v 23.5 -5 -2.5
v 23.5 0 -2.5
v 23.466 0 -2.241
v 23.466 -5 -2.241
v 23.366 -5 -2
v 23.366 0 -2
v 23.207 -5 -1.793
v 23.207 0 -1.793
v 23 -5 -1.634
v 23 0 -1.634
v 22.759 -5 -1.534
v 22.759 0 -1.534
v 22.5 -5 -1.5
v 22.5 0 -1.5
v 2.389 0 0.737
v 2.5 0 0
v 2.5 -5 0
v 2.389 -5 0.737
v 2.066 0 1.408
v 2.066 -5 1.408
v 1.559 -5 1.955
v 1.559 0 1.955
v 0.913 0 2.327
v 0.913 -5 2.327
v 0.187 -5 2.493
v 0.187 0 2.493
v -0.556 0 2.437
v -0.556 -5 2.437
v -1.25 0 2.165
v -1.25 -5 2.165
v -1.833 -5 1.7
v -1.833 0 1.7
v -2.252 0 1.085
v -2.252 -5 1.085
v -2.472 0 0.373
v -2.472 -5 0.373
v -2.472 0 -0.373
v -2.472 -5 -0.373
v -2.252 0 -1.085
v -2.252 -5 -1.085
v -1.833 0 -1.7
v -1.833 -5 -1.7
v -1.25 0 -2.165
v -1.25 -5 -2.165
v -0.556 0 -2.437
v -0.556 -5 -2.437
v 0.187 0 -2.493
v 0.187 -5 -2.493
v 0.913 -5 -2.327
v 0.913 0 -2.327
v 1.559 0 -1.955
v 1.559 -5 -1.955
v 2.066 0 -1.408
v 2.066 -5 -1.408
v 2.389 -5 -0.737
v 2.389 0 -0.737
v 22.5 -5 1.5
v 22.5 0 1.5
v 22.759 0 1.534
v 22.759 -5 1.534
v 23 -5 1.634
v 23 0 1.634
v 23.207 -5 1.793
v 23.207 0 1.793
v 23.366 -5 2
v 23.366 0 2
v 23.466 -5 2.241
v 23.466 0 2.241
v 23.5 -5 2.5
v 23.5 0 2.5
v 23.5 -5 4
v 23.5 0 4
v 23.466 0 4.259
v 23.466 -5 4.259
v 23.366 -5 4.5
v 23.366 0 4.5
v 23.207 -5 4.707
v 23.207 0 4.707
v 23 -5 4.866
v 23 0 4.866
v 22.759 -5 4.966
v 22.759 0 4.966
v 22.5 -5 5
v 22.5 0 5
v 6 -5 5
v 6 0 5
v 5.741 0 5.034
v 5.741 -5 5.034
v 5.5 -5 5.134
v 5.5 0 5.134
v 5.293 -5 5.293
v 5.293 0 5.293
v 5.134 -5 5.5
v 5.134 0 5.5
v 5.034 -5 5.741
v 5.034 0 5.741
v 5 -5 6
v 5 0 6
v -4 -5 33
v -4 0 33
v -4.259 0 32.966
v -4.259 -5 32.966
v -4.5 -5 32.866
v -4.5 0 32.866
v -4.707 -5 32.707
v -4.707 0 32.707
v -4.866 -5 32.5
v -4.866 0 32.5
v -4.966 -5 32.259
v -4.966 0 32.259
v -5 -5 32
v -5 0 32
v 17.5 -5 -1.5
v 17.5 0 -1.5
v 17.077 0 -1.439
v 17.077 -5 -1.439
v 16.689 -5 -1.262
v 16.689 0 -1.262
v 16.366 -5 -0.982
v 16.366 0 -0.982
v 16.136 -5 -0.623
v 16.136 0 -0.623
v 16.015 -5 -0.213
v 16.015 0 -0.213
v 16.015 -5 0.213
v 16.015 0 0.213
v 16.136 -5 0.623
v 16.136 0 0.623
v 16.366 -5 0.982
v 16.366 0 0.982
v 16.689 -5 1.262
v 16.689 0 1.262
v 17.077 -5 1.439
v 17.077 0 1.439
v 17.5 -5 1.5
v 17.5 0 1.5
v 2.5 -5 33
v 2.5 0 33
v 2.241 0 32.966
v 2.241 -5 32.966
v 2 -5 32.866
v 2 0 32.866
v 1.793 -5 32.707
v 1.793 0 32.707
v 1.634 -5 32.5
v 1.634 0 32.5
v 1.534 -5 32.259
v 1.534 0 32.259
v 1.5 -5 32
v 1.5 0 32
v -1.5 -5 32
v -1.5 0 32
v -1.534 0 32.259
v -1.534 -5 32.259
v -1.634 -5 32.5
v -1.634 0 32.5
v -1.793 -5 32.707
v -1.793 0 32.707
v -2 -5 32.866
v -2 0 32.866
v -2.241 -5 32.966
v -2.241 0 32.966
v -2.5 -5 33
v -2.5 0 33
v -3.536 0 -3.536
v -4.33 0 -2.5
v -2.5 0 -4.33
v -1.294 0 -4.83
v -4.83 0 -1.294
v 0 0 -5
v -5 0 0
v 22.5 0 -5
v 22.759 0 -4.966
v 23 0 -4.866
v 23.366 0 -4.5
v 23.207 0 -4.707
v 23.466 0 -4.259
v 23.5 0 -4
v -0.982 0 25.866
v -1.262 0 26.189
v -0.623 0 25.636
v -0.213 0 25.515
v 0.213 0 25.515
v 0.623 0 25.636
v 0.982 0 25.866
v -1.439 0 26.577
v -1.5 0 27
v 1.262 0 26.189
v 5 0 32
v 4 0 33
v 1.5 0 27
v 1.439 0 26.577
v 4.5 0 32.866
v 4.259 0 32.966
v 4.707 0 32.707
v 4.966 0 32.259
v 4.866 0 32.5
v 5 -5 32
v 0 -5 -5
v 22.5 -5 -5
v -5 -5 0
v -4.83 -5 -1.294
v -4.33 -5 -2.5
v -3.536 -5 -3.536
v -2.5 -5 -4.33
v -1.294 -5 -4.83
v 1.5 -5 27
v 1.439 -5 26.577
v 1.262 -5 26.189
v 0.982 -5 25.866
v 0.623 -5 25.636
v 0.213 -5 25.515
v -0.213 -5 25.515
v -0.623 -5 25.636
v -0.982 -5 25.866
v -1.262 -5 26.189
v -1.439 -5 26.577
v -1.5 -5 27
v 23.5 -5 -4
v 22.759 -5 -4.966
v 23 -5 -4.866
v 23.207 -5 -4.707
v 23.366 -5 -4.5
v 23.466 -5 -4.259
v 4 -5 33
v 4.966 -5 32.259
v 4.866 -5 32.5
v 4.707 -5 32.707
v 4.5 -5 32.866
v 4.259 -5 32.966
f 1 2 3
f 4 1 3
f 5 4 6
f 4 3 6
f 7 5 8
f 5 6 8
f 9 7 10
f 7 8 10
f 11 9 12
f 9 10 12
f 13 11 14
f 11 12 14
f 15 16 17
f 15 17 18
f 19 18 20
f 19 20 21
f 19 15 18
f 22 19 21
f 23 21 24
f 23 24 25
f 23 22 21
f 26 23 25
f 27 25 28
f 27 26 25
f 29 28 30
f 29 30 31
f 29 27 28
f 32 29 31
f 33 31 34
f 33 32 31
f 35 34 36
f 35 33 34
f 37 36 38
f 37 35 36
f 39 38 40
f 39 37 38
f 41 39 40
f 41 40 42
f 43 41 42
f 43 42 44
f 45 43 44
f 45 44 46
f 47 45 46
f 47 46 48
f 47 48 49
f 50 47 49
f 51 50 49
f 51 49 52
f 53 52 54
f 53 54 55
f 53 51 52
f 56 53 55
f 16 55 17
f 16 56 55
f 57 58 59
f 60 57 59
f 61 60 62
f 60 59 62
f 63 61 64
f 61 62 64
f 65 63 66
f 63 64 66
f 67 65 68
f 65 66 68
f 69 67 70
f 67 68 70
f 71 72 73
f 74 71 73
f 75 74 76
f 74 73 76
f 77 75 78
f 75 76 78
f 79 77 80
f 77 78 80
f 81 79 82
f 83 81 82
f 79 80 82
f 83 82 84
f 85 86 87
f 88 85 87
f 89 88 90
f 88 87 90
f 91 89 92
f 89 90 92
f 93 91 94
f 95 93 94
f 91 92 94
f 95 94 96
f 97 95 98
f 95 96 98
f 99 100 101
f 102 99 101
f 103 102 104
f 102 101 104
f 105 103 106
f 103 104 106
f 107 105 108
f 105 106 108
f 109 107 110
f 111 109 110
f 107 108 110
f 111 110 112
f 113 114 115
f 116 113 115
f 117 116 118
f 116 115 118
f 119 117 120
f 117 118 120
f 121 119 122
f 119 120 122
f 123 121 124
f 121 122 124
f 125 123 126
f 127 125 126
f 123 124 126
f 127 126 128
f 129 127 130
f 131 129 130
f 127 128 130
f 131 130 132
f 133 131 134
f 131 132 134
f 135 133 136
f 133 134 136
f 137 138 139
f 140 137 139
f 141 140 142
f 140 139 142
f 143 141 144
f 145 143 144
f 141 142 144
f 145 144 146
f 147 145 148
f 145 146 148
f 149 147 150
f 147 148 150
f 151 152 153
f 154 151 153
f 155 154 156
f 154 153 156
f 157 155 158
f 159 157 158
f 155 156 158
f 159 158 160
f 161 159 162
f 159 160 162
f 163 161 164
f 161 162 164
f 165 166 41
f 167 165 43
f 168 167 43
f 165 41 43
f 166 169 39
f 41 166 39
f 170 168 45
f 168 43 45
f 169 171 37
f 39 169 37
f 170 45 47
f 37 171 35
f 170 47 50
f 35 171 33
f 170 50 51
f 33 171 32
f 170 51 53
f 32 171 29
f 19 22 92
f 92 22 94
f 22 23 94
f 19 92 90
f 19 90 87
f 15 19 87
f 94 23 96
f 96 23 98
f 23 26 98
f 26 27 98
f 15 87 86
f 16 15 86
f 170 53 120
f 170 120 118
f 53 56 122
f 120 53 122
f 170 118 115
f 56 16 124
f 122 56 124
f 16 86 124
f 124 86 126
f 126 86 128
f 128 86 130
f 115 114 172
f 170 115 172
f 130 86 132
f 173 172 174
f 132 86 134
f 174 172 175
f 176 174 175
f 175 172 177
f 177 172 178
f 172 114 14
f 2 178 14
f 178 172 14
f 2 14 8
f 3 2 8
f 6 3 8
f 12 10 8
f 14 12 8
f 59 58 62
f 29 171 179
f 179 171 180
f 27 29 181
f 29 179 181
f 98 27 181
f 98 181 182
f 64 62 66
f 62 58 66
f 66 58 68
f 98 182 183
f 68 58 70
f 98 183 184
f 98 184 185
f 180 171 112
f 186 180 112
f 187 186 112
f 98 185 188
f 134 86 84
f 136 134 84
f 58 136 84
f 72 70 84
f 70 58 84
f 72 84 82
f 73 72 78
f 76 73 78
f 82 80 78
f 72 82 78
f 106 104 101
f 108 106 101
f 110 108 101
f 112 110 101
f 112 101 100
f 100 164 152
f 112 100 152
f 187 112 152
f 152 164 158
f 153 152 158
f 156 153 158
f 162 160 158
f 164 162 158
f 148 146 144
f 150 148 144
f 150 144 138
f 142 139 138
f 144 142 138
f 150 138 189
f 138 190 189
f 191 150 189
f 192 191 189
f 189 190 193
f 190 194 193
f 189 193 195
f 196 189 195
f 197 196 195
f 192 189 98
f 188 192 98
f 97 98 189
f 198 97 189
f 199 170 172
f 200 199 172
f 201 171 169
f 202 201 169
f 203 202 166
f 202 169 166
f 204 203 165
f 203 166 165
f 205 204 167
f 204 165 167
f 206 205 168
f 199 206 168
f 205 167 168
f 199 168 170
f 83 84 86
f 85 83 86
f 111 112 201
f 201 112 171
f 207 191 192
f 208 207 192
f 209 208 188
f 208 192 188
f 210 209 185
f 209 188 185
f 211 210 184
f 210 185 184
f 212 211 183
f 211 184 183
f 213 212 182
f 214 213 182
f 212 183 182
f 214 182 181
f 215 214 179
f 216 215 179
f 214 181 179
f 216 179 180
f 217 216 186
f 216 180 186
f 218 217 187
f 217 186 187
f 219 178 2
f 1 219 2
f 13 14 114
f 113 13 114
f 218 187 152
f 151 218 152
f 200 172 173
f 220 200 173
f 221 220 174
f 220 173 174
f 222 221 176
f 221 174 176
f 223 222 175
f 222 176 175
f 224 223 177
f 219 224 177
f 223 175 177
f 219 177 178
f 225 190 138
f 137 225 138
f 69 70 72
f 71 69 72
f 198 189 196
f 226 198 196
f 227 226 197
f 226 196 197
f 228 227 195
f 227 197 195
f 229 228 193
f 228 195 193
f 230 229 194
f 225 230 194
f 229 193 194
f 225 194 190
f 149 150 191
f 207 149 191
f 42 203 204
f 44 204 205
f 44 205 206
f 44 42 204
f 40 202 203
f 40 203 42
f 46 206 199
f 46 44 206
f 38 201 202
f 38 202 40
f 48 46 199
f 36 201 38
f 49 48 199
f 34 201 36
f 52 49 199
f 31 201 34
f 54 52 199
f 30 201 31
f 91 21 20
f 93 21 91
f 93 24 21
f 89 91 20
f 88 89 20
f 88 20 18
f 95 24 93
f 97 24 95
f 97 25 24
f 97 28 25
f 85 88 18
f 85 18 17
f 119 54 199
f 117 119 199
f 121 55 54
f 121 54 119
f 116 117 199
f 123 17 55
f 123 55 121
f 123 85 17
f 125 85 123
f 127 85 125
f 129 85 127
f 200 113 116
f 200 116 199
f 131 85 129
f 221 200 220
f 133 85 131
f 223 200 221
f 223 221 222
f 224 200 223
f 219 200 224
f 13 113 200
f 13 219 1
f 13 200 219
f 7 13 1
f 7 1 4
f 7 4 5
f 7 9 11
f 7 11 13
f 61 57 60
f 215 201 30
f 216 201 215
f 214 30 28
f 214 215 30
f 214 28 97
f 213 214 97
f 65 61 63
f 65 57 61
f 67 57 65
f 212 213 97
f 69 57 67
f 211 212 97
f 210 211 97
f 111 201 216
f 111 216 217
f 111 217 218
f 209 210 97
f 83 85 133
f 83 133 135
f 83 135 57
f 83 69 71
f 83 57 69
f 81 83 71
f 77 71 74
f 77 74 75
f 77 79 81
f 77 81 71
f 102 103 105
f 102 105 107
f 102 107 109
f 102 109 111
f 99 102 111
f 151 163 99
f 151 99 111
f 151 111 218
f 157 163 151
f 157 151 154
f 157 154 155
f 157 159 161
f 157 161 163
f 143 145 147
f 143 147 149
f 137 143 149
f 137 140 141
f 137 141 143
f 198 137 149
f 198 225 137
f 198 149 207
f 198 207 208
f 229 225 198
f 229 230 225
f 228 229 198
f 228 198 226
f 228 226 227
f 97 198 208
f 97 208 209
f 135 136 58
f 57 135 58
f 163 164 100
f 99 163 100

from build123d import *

# Parameters (mm, degrees)
F0_R     = 2.5
F1_DEPTH = 5


with BuildPart() as f1:
    # F0 (on Front) → F1 (new body)
    with BuildSketch(Plane.XZ):
        with BuildLine():
            Line((-2.5, 33), (-4, 33))
            ThreePointArc((-4, 33), (-4.707107, 32.707107), (-5, 32))
            Line((-5, 32), (-5, 0))
            ThreePointArc((-5, 0), (-3.535534, -3.535534), (0, -5))
            Line((0, -5), (22.5, -5))
            ThreePointArc((22.5, -5), (23.207107, -4.707107), (23.5, -4))
            Line((23.5, -4), (23.5, -2.5))
            ThreePointArc((23.5, -2.5), (23.207107, -1.792893), (22.5, -1.5))
            Line((22.5, -1.5), (17.5, -1.5))
            ThreePointArc((17.5, -1.5), (16, 0), (17.5, 1.5))
            Line((17.5, 1.5), (22.5, 1.5))
            ThreePointArc((22.5, 1.5), (23.207107, 1.792893), (23.5, 2.5))
            Line((23.5, 2.5), (23.5, 4))
            ThreePointArc((23.5, 4), (23.207107, 4.707107), (22.5, 5))
            Line((22.5, 5), (6, 5))
            ThreePointArc((6, 5), (5.292893, 5.292893), (5, 6))
            Line((5, 6), (5, 32))
            ThreePointArc((5, 32), (4.707107, 32.707107), (4, 33))
            Line((4, 33), (2.5, 33))
            ThreePointArc((2.5, 33), (1.792893, 32.707107), (1.5, 32))
            Line((1.5, 32), (1.5, 27))
            ThreePointArc((1.5, 27), (0, 25.5), (-1.5, 27))
            Line((-1.5, 27), (-1.5, 32))
            ThreePointArc((-1.5, 32), (-1.792893, 32.707107), (-2.5, 33))
        make_face()
        Circle(F0_R, mode=Mode.SUBTRACT)
    extrude(amount=F1_DEPTH)


solid = f1.part
